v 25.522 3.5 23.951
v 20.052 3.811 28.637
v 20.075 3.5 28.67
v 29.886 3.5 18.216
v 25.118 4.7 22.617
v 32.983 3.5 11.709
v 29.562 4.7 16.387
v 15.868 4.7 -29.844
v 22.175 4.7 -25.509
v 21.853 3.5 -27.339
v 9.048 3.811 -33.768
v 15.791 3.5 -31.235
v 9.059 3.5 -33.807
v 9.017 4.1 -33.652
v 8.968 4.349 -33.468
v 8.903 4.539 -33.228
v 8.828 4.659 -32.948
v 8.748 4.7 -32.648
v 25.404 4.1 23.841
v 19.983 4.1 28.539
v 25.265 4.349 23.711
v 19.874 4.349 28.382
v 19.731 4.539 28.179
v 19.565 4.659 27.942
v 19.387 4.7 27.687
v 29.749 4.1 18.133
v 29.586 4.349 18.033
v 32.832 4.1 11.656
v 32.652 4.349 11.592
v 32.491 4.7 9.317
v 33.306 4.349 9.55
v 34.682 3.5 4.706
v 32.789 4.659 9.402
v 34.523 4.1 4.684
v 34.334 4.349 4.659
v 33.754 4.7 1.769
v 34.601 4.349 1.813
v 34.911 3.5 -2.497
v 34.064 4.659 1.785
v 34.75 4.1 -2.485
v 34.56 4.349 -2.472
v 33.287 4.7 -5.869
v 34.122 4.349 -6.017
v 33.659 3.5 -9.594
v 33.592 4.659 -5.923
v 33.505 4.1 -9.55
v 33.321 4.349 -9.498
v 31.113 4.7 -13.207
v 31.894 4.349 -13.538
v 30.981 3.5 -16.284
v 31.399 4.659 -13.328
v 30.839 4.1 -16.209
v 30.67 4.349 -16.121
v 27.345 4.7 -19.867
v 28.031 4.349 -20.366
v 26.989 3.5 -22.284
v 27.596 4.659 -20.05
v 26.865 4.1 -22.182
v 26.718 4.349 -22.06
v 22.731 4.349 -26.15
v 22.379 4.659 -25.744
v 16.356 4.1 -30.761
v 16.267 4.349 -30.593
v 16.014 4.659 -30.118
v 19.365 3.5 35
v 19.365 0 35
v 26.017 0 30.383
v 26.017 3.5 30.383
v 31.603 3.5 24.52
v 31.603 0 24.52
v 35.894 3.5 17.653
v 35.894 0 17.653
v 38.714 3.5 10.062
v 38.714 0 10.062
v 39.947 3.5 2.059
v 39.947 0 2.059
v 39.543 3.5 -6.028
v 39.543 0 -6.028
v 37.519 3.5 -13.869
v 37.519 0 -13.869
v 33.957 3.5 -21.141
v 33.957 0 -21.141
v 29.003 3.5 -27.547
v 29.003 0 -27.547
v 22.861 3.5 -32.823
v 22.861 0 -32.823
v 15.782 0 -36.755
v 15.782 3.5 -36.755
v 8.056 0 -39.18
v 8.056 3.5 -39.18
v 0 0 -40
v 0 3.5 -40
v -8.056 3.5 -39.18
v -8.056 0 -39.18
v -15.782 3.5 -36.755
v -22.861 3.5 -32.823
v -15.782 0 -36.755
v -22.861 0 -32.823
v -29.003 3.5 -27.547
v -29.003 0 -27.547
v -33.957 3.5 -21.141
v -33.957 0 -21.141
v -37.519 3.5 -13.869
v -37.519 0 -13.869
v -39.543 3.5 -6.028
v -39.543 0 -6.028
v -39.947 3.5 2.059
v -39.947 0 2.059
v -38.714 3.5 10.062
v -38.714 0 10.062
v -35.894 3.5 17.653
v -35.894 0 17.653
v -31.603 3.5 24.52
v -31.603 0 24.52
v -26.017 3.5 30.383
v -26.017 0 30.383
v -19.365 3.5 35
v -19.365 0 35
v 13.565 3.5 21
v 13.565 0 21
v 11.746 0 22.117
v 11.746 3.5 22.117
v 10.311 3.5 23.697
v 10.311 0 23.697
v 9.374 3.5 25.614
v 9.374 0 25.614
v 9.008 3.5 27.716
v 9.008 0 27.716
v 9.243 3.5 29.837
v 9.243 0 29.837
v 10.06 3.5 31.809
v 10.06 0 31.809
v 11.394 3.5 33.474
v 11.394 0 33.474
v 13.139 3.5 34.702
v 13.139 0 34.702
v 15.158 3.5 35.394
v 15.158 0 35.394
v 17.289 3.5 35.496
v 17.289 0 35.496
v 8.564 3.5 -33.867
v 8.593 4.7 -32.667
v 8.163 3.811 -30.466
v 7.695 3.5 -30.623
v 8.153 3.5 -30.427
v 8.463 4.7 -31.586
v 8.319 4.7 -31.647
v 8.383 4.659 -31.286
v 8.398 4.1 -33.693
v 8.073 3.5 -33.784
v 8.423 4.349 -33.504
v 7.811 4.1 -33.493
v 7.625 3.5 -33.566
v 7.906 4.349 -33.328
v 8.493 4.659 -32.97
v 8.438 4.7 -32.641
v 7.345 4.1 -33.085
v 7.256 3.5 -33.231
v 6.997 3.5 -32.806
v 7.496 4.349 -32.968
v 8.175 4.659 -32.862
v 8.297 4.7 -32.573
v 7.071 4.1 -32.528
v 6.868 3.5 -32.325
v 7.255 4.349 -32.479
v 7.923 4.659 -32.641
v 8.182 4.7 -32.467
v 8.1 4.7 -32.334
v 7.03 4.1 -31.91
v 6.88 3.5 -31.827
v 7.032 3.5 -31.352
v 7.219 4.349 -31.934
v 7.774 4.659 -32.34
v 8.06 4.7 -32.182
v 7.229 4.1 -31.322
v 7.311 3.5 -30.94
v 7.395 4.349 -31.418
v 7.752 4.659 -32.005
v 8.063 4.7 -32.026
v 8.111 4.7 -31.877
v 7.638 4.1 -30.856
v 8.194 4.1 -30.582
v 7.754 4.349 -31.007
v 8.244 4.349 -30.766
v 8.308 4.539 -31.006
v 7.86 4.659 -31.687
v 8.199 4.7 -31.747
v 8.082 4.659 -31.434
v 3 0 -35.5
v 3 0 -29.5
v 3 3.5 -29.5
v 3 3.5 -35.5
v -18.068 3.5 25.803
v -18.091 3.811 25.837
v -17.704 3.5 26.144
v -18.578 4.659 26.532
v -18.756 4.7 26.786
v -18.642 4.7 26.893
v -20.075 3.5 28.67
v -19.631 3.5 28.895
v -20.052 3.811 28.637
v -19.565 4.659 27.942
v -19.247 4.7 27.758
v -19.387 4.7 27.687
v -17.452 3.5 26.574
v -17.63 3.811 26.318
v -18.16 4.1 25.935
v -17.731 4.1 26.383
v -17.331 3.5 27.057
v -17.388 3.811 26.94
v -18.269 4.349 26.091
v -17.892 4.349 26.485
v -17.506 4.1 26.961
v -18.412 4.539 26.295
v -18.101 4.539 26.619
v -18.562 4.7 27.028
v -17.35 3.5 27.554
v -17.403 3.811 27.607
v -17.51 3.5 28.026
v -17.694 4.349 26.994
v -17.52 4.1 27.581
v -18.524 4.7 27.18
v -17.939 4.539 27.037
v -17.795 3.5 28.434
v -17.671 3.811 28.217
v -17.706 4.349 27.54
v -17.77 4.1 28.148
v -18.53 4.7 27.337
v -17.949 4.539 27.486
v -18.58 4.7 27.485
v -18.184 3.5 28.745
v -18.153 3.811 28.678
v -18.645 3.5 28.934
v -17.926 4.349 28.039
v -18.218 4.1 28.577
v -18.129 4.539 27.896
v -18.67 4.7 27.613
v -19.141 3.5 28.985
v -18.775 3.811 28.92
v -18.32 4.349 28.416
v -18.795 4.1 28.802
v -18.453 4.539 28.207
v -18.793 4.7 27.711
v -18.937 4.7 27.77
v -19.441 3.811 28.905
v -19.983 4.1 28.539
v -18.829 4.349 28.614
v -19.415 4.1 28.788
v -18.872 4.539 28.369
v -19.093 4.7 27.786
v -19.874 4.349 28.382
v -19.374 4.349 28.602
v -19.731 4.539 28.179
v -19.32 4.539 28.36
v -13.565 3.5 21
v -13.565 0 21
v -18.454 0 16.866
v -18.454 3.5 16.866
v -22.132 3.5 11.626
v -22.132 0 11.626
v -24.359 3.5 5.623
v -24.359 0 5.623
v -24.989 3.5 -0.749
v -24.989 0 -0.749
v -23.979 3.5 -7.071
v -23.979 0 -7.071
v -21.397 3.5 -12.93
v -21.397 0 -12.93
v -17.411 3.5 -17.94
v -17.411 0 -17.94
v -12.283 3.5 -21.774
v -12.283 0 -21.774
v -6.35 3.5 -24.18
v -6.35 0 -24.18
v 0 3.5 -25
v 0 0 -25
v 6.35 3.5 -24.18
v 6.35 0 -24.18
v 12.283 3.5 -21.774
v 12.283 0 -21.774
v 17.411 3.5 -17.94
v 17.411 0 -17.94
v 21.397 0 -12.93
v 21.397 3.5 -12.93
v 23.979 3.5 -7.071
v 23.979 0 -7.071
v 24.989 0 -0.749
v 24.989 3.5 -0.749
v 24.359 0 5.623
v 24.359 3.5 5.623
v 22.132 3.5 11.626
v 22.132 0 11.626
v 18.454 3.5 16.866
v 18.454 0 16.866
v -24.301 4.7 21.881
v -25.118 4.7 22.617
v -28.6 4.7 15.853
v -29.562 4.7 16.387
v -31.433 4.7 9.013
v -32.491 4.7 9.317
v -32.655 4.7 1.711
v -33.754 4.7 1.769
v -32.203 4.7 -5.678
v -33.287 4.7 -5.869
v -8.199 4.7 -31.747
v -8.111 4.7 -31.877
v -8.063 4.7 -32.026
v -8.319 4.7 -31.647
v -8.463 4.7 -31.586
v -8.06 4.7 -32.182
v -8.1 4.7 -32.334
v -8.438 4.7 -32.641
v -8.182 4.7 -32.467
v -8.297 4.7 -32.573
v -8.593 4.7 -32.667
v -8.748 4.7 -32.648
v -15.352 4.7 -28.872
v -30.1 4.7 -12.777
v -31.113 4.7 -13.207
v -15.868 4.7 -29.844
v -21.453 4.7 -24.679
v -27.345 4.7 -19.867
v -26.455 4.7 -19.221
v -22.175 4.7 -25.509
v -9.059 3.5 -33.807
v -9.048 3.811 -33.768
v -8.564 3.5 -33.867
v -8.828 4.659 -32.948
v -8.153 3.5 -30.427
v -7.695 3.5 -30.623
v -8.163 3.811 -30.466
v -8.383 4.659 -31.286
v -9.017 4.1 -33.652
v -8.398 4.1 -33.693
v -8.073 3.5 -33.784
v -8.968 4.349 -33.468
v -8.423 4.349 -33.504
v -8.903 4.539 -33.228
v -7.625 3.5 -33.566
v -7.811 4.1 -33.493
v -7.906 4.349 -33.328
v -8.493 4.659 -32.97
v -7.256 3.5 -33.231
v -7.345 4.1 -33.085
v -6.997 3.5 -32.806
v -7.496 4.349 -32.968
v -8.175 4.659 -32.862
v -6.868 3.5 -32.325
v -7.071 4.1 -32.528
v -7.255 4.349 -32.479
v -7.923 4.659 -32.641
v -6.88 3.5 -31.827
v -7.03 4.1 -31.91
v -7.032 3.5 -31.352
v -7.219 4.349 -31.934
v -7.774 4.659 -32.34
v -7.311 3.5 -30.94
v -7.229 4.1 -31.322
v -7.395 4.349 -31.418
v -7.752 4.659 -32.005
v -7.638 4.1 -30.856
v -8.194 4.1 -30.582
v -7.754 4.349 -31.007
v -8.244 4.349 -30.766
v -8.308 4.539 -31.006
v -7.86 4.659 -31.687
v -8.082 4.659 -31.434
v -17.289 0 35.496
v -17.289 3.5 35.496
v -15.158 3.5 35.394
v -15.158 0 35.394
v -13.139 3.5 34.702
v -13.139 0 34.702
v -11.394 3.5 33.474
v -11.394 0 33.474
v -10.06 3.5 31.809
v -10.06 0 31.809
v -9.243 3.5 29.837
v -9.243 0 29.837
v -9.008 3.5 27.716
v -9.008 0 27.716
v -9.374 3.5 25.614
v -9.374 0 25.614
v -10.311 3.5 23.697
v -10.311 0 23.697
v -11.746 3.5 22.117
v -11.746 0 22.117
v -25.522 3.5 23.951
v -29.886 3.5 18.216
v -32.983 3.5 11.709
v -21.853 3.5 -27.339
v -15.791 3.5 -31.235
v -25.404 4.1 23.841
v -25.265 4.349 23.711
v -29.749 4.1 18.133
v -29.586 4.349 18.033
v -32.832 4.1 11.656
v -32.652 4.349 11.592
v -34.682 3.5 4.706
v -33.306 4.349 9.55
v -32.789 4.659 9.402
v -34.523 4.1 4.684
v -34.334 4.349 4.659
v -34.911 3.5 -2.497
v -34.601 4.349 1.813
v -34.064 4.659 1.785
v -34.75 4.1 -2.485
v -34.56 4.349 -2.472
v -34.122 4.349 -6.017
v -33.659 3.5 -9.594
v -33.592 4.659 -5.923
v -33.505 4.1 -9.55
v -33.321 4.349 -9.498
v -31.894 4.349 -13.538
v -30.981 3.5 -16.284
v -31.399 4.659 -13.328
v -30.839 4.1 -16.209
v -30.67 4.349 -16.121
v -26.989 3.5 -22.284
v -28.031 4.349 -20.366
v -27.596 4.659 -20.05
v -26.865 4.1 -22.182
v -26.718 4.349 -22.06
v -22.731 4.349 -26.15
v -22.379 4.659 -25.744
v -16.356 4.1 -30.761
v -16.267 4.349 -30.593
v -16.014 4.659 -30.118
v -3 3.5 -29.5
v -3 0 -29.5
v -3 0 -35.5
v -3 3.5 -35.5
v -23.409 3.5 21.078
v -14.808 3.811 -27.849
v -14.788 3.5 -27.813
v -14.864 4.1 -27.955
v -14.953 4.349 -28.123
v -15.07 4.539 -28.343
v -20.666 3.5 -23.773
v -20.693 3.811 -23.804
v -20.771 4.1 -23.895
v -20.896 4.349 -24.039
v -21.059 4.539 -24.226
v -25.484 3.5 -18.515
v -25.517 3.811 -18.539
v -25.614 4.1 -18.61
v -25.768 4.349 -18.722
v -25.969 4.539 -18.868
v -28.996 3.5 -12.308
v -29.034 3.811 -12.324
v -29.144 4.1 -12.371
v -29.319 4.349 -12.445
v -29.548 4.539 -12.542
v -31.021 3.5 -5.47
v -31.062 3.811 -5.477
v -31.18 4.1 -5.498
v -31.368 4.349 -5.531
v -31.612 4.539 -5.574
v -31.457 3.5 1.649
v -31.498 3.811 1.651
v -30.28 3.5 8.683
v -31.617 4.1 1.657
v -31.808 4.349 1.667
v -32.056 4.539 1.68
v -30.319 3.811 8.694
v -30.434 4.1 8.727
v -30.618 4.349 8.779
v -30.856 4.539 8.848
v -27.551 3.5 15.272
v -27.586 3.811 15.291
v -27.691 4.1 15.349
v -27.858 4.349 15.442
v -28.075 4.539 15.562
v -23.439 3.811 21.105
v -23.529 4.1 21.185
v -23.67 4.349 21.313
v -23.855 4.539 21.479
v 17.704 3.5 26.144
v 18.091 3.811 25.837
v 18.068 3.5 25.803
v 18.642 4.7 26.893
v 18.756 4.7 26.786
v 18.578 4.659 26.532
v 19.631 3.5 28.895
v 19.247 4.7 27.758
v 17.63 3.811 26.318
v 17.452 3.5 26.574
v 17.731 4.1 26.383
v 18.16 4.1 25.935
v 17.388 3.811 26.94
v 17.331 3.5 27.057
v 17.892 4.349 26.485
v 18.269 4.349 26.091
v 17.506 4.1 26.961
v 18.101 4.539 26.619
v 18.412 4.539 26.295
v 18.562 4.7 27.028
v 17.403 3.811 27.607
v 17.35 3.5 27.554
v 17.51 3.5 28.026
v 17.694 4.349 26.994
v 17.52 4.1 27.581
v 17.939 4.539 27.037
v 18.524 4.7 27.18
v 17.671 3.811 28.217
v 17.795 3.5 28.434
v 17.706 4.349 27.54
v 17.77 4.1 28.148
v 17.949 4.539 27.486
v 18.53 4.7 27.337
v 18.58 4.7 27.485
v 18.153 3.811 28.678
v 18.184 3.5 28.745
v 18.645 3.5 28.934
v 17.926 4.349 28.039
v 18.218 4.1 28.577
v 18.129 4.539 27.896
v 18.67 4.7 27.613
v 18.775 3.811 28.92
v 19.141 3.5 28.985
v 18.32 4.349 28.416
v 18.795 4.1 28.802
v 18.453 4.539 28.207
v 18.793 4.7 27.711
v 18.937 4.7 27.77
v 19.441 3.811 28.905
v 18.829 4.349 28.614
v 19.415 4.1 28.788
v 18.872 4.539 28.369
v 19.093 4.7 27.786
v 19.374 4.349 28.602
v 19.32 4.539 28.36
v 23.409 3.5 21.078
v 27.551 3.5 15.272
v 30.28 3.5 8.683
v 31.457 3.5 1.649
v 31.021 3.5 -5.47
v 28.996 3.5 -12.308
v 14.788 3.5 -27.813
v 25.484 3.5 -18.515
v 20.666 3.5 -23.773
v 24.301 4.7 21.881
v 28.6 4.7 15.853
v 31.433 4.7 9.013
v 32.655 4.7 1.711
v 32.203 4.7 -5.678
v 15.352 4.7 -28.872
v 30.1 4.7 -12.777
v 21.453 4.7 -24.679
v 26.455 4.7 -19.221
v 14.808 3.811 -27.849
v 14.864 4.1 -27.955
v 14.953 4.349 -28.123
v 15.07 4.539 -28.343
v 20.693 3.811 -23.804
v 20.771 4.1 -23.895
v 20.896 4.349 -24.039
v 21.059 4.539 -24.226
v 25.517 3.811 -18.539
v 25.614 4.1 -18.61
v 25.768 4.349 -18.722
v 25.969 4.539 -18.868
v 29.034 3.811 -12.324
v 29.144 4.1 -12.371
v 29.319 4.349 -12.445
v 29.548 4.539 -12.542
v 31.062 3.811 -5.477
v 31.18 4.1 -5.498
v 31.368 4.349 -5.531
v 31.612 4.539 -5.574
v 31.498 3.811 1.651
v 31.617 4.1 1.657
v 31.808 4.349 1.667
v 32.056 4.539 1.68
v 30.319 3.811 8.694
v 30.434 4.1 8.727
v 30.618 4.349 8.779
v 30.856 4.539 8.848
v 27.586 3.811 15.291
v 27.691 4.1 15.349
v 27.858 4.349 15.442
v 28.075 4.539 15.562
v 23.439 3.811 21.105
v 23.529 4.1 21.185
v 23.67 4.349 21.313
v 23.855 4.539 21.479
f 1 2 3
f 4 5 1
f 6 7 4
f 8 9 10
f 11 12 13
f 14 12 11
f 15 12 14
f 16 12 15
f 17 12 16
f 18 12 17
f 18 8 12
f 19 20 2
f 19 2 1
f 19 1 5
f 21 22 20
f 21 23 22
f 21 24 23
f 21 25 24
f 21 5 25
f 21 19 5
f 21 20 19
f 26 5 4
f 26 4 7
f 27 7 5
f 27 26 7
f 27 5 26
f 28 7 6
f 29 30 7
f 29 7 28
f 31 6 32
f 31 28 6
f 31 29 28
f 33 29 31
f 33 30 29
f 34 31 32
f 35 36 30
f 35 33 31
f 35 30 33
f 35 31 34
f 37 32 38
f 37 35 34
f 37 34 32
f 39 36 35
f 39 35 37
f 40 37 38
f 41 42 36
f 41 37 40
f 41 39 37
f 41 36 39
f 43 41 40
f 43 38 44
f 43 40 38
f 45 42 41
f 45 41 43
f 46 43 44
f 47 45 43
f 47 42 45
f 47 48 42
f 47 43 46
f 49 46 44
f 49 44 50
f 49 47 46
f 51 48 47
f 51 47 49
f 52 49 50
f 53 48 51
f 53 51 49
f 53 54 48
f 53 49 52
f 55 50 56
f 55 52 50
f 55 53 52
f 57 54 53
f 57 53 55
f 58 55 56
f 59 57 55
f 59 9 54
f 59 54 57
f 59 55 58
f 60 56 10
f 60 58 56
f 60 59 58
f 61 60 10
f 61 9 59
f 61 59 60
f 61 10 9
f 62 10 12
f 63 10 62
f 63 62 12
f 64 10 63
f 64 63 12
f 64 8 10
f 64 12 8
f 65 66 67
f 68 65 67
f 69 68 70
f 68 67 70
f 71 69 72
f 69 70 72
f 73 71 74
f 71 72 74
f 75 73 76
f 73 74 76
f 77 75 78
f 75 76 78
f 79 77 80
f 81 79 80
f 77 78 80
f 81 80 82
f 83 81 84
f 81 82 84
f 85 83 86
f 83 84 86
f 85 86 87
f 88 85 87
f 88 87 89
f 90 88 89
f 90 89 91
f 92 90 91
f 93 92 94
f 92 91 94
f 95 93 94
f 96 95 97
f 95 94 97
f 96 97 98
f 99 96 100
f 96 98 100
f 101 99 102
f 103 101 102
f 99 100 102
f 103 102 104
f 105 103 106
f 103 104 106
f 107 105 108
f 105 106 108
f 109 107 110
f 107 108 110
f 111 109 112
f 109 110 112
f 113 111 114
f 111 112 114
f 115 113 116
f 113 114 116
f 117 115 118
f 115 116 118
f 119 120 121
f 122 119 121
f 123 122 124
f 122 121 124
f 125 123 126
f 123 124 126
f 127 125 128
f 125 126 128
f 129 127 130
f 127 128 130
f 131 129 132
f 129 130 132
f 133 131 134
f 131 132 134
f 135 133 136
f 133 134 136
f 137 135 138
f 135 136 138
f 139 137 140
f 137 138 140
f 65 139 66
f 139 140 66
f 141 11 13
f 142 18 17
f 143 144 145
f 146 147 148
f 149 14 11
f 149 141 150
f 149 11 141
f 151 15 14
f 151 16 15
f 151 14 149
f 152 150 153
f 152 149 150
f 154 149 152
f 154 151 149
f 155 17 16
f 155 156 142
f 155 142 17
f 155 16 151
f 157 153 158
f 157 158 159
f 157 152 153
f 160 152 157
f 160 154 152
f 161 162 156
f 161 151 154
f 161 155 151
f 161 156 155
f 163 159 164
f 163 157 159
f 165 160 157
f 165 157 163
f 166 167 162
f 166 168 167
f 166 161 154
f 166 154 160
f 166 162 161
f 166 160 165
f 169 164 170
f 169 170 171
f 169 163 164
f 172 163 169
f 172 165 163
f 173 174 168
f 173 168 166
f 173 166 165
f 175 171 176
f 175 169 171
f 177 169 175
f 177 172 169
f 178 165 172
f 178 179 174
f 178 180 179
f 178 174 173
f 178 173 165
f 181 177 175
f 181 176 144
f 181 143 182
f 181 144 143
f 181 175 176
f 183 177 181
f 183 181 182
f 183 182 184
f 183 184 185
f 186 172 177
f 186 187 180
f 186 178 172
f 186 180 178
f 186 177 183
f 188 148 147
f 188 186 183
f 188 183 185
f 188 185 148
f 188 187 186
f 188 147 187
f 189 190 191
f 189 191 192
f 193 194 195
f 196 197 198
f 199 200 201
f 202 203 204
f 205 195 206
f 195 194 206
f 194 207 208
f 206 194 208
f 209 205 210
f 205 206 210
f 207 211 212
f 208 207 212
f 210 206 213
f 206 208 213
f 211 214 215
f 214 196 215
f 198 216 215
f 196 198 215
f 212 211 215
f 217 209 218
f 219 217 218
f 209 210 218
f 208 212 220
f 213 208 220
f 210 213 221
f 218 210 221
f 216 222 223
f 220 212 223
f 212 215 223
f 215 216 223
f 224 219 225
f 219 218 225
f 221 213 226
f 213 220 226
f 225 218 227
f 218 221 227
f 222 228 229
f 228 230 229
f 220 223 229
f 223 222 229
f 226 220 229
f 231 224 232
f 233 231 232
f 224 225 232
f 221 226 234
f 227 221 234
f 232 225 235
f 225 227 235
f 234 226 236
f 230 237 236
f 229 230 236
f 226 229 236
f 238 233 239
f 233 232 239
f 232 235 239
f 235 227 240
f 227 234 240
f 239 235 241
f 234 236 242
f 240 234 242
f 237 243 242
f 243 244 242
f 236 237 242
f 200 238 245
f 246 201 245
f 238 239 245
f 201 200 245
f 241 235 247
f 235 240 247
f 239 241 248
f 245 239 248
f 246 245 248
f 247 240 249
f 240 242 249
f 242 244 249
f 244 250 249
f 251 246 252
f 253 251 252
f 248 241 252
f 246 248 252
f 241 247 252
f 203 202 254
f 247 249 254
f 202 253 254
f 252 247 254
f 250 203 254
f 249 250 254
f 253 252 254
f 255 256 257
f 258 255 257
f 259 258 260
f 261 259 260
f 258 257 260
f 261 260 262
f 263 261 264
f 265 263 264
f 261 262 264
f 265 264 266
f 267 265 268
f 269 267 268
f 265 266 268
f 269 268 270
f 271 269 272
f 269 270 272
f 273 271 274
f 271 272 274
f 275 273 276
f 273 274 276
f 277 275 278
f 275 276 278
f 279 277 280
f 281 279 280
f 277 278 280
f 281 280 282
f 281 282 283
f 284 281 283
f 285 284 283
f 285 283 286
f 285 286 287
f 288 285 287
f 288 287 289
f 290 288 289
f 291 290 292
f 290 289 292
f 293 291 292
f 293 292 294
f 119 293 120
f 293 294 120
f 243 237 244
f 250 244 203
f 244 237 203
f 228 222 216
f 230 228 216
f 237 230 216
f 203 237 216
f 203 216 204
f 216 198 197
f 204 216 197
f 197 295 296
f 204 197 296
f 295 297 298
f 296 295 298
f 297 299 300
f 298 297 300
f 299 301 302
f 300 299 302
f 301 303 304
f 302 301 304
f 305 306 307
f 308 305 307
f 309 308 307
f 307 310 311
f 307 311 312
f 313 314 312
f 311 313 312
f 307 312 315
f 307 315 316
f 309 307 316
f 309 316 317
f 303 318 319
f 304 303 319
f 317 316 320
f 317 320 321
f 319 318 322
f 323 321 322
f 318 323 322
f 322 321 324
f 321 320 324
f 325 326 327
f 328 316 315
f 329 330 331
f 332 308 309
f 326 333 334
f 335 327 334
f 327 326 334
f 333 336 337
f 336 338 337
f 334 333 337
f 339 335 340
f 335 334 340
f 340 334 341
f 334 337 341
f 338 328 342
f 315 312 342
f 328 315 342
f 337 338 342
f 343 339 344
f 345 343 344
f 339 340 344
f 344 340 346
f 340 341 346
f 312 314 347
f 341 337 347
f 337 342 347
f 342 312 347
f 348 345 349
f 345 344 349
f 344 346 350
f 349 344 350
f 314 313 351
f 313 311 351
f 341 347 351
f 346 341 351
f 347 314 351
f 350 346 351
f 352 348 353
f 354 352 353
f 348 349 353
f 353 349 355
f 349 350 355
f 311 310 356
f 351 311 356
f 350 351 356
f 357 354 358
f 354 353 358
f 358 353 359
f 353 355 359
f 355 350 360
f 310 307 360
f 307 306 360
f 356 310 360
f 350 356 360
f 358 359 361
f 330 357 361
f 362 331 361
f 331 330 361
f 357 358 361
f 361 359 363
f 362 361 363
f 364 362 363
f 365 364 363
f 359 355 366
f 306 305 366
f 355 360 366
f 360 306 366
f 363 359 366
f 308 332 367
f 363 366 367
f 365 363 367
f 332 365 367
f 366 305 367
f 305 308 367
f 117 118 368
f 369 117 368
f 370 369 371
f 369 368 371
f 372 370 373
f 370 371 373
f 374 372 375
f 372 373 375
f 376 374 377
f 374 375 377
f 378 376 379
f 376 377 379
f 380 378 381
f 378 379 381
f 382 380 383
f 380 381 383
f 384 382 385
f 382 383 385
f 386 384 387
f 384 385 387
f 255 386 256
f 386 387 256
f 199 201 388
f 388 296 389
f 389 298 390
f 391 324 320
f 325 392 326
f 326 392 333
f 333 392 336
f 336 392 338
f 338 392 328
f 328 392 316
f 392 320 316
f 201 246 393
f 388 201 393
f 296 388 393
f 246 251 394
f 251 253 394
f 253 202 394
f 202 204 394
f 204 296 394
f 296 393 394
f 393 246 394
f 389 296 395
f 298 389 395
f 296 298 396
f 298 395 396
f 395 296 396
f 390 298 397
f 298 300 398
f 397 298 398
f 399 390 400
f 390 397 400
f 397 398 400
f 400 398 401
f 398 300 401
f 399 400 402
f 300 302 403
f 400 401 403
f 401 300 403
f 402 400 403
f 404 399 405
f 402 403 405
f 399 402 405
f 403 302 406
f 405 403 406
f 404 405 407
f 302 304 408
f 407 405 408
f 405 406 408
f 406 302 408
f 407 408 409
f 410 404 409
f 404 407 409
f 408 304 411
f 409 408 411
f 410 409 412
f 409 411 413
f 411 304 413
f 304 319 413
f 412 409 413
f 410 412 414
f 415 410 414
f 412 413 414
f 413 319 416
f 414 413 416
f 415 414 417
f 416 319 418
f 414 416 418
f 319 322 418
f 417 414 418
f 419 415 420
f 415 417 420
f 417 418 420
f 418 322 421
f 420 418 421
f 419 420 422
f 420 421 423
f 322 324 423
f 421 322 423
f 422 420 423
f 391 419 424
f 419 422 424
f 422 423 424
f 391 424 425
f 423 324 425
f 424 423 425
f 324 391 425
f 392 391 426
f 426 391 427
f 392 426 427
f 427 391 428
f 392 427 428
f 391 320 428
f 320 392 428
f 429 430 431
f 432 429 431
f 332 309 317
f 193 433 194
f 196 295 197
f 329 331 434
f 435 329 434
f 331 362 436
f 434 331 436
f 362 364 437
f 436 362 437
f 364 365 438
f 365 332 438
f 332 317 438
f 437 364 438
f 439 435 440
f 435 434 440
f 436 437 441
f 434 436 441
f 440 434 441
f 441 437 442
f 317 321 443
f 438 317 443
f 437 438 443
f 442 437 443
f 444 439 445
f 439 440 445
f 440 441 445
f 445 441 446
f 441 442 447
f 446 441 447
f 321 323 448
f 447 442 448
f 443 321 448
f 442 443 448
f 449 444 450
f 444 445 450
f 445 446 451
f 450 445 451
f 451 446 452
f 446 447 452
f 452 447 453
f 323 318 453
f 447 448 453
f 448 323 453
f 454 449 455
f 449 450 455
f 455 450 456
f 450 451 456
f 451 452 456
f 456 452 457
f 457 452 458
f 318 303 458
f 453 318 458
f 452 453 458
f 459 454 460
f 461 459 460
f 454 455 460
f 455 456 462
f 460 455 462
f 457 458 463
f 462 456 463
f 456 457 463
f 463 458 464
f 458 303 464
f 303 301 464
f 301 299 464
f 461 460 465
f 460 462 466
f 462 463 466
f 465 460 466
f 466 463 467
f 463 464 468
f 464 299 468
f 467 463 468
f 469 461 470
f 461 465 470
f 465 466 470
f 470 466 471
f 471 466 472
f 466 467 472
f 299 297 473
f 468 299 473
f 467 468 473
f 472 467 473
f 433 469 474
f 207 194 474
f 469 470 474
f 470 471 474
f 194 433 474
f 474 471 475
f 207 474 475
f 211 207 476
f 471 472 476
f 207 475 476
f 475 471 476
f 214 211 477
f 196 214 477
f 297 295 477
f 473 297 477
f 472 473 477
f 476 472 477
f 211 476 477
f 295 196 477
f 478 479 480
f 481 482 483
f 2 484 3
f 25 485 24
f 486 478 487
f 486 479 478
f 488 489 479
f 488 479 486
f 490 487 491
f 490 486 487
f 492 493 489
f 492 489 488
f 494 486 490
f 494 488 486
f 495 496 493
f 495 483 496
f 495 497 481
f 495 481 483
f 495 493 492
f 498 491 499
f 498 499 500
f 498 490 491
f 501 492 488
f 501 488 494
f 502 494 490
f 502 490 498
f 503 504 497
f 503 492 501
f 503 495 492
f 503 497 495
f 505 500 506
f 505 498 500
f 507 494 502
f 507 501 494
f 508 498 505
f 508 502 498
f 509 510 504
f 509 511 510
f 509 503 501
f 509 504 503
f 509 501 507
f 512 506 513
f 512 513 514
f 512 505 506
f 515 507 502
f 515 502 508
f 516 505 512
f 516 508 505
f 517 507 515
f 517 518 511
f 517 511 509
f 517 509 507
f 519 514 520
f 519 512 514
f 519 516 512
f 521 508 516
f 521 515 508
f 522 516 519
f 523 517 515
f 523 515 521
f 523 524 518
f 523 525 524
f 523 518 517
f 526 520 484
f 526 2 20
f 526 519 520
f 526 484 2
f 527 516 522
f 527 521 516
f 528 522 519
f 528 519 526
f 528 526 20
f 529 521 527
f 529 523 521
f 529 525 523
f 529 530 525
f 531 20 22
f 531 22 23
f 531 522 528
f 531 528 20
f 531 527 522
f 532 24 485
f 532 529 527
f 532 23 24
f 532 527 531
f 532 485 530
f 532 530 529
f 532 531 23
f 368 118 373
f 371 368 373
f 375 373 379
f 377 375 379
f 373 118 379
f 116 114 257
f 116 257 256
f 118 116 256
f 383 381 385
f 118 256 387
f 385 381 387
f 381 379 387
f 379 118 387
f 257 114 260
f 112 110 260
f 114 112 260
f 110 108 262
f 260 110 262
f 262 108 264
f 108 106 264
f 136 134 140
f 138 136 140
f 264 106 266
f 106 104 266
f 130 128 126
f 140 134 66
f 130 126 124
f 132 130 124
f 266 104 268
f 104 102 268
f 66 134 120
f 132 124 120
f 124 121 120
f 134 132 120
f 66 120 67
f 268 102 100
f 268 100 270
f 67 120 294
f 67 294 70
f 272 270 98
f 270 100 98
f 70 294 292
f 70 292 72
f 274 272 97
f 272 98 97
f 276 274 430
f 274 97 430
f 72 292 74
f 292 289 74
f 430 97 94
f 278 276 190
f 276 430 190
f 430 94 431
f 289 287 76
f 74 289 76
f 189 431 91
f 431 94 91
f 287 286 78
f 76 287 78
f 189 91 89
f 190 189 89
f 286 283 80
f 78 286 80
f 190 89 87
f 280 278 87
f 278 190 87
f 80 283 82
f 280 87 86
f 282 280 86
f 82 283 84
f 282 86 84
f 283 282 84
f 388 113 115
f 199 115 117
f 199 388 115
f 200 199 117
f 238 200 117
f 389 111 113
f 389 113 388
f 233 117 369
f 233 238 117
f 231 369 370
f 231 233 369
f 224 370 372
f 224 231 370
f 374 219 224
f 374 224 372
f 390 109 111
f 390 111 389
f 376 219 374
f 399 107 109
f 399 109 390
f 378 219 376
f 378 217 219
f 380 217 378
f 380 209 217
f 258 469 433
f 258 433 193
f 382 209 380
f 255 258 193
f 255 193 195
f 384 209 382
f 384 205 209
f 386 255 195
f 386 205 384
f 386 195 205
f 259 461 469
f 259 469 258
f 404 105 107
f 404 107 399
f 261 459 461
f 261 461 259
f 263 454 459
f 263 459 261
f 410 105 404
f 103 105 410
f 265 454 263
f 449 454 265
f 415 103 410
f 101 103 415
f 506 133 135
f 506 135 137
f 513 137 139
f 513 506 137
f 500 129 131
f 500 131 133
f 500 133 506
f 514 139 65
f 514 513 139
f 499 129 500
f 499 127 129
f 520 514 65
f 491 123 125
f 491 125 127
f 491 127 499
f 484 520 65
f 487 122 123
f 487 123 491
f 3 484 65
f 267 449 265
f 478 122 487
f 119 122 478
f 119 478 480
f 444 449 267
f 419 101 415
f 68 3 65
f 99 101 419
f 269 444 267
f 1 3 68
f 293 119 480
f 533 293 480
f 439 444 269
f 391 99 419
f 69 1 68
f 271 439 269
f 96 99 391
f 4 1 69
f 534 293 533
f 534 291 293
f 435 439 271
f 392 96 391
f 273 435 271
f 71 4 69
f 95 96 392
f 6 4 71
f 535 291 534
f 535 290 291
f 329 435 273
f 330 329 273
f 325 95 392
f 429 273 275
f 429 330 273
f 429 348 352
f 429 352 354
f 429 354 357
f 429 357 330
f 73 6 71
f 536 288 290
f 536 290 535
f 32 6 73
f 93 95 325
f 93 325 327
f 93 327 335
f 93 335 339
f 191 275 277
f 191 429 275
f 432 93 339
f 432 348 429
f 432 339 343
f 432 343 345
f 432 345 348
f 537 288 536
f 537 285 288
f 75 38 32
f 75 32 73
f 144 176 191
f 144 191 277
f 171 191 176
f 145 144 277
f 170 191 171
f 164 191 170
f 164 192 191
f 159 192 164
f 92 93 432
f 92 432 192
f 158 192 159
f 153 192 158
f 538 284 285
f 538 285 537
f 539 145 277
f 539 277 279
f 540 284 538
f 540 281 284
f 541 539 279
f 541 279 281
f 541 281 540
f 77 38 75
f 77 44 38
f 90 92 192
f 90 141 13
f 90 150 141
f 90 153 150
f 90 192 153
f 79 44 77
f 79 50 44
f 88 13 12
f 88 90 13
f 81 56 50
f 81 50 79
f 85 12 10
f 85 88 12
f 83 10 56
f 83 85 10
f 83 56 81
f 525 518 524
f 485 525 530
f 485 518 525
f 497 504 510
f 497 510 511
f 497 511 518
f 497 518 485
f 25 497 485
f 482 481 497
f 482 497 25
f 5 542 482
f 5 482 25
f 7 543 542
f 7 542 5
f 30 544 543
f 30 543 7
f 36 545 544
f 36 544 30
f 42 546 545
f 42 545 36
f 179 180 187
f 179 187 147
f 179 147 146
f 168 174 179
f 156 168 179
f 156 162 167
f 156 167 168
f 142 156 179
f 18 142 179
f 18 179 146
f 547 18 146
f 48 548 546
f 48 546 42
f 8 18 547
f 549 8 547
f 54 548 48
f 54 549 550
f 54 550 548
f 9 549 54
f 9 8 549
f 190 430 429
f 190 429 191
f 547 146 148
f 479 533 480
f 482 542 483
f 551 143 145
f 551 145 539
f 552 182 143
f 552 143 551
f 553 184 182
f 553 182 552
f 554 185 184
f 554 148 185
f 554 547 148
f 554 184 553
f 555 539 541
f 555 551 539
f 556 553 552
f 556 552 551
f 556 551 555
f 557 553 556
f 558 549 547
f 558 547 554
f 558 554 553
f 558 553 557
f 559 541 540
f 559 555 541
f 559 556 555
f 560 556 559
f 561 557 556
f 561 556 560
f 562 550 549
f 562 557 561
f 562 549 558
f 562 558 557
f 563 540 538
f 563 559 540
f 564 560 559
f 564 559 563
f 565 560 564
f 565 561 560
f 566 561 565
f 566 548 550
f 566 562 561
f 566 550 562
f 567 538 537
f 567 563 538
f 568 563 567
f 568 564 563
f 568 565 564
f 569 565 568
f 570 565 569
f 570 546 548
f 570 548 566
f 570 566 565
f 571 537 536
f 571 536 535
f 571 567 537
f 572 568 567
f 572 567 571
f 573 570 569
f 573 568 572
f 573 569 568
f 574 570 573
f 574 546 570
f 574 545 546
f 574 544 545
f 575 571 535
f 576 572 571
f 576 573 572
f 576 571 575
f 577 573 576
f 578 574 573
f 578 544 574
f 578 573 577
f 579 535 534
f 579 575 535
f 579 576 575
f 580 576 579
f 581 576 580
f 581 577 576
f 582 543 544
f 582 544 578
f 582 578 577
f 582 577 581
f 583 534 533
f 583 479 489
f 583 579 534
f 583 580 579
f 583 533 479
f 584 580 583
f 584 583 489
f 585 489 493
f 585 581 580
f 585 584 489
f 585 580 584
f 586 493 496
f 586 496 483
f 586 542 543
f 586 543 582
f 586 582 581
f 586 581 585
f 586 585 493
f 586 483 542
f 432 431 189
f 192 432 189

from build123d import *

# Parameters (mm, degrees)
ESQUISSE1_W           = 6
ESQUISSE1_H           = 6
BOSS_EXTRU_2_DEPTH    = 3.5
BOSS_EXTRU_3_DEPTH    = 1.2
CONG_2_R              = 1.2
CONG_2_OF_SYM_TRIE2_R = 1.2


with BuildPart() as part:
    # Esquisse1 → Boss.-Extru.2 (new body)
    with BuildSketch(Plane(origin=(0, 0, 0), x_dir=(1, 0, 0), z_dir=(0, 1, 0))):
        with BuildLine():
            ThreePointArc((19.364916731, -35), (0, 40), (-19.364916731, -35))
            ThreePointArc((-19.364916731, -35), (-9.581446139, -30.851796587), (-13.564659966, -21))
            ThreePointArc((-13.564659966, -21), (0, 25), (13.564659966, -21))
            ThreePointArc((13.564659966, -21), (9.581446139, -30.851796587), (19.364916731, -35))
        make_face()
        with Locations((0, 32.5)):
            Rectangle(ESQUISSE1_W, ESQUISSE1_H, mode=Mode.SUBTRACT)
    extrude(amount=BOSS_EXTRU_2_DEPTH)

    # Esquisse5 → Boss.-Extru.3 (add)
    with BuildSketch(Plane(origin=(0, 3.5, 0), x_dir=(1, 0, 0), z_dir=(0, 1, 0))):
        with BuildLine():
            ThreePointArc((-20.075175272, -28.67032155), (-34.468271355, 6.077686218), (-9.058666579, 33.80740392))
            ThreePointArc((-9.058666579, 33.80740392), (-6.915363054, 32.569967053), (-8.152799921, 30.426663528))
            ThreePointArc((-8.152799921, 30.426663528), (-31.02144422, 5.469917597), (-18.067657745, -25.803289395))
            ThreePointArc((-18.067657745, -25.803289395), (-17.637900431, -28.240564236), (-20.075175272, -28.67032155))
        make_face()
    boss_extru_3 = extrude(amount=BOSS_EXTRU_3_DEPTH)

    # Congé2
    cong_2_edges = [part.edges().sort_by_distance(p)[0] for p in [
        (-34.468271355, 4.7, -6.077686218),
        (-6.915363054, 4.7, -32.569967053),
        (-31.02144422, 4.7, -5.469917597),
        (-17.637900431, 4.7, 28.240564236),
    ]]
    fillet(cong_2_edges, radius=CONG_2_R - 0.0001)  # a hair under: the kernel refuses the full size

    # Symétrie2: Boss.-Extru.3 across plane
    add(boss_extru_3.mirror(Plane(origin=(0, 0, 0), x_dir=(0, 0, 1), z_dir=(1, 0, 0))))

    # Congé2 of Symétrie2
    cong_2_of_sym_trie2_edges = [part.edges().sort_by_distance(p)[0] for p in [
        (34.468271355, 4.7, -6.077686218),
        (6.915363054, 4.7, -32.569967053),
        (31.02144422, 4.7, -5.469917597),
        (17.637900431, 4.7, 28.240564236),
    ]]
    fillet(cong_2_of_sym_trie2_edges, radius=CONG_2_OF_SYM_TRIE2_R - 0.0001)  # a hair under: the kernel refuses the full size


solid = part.part
